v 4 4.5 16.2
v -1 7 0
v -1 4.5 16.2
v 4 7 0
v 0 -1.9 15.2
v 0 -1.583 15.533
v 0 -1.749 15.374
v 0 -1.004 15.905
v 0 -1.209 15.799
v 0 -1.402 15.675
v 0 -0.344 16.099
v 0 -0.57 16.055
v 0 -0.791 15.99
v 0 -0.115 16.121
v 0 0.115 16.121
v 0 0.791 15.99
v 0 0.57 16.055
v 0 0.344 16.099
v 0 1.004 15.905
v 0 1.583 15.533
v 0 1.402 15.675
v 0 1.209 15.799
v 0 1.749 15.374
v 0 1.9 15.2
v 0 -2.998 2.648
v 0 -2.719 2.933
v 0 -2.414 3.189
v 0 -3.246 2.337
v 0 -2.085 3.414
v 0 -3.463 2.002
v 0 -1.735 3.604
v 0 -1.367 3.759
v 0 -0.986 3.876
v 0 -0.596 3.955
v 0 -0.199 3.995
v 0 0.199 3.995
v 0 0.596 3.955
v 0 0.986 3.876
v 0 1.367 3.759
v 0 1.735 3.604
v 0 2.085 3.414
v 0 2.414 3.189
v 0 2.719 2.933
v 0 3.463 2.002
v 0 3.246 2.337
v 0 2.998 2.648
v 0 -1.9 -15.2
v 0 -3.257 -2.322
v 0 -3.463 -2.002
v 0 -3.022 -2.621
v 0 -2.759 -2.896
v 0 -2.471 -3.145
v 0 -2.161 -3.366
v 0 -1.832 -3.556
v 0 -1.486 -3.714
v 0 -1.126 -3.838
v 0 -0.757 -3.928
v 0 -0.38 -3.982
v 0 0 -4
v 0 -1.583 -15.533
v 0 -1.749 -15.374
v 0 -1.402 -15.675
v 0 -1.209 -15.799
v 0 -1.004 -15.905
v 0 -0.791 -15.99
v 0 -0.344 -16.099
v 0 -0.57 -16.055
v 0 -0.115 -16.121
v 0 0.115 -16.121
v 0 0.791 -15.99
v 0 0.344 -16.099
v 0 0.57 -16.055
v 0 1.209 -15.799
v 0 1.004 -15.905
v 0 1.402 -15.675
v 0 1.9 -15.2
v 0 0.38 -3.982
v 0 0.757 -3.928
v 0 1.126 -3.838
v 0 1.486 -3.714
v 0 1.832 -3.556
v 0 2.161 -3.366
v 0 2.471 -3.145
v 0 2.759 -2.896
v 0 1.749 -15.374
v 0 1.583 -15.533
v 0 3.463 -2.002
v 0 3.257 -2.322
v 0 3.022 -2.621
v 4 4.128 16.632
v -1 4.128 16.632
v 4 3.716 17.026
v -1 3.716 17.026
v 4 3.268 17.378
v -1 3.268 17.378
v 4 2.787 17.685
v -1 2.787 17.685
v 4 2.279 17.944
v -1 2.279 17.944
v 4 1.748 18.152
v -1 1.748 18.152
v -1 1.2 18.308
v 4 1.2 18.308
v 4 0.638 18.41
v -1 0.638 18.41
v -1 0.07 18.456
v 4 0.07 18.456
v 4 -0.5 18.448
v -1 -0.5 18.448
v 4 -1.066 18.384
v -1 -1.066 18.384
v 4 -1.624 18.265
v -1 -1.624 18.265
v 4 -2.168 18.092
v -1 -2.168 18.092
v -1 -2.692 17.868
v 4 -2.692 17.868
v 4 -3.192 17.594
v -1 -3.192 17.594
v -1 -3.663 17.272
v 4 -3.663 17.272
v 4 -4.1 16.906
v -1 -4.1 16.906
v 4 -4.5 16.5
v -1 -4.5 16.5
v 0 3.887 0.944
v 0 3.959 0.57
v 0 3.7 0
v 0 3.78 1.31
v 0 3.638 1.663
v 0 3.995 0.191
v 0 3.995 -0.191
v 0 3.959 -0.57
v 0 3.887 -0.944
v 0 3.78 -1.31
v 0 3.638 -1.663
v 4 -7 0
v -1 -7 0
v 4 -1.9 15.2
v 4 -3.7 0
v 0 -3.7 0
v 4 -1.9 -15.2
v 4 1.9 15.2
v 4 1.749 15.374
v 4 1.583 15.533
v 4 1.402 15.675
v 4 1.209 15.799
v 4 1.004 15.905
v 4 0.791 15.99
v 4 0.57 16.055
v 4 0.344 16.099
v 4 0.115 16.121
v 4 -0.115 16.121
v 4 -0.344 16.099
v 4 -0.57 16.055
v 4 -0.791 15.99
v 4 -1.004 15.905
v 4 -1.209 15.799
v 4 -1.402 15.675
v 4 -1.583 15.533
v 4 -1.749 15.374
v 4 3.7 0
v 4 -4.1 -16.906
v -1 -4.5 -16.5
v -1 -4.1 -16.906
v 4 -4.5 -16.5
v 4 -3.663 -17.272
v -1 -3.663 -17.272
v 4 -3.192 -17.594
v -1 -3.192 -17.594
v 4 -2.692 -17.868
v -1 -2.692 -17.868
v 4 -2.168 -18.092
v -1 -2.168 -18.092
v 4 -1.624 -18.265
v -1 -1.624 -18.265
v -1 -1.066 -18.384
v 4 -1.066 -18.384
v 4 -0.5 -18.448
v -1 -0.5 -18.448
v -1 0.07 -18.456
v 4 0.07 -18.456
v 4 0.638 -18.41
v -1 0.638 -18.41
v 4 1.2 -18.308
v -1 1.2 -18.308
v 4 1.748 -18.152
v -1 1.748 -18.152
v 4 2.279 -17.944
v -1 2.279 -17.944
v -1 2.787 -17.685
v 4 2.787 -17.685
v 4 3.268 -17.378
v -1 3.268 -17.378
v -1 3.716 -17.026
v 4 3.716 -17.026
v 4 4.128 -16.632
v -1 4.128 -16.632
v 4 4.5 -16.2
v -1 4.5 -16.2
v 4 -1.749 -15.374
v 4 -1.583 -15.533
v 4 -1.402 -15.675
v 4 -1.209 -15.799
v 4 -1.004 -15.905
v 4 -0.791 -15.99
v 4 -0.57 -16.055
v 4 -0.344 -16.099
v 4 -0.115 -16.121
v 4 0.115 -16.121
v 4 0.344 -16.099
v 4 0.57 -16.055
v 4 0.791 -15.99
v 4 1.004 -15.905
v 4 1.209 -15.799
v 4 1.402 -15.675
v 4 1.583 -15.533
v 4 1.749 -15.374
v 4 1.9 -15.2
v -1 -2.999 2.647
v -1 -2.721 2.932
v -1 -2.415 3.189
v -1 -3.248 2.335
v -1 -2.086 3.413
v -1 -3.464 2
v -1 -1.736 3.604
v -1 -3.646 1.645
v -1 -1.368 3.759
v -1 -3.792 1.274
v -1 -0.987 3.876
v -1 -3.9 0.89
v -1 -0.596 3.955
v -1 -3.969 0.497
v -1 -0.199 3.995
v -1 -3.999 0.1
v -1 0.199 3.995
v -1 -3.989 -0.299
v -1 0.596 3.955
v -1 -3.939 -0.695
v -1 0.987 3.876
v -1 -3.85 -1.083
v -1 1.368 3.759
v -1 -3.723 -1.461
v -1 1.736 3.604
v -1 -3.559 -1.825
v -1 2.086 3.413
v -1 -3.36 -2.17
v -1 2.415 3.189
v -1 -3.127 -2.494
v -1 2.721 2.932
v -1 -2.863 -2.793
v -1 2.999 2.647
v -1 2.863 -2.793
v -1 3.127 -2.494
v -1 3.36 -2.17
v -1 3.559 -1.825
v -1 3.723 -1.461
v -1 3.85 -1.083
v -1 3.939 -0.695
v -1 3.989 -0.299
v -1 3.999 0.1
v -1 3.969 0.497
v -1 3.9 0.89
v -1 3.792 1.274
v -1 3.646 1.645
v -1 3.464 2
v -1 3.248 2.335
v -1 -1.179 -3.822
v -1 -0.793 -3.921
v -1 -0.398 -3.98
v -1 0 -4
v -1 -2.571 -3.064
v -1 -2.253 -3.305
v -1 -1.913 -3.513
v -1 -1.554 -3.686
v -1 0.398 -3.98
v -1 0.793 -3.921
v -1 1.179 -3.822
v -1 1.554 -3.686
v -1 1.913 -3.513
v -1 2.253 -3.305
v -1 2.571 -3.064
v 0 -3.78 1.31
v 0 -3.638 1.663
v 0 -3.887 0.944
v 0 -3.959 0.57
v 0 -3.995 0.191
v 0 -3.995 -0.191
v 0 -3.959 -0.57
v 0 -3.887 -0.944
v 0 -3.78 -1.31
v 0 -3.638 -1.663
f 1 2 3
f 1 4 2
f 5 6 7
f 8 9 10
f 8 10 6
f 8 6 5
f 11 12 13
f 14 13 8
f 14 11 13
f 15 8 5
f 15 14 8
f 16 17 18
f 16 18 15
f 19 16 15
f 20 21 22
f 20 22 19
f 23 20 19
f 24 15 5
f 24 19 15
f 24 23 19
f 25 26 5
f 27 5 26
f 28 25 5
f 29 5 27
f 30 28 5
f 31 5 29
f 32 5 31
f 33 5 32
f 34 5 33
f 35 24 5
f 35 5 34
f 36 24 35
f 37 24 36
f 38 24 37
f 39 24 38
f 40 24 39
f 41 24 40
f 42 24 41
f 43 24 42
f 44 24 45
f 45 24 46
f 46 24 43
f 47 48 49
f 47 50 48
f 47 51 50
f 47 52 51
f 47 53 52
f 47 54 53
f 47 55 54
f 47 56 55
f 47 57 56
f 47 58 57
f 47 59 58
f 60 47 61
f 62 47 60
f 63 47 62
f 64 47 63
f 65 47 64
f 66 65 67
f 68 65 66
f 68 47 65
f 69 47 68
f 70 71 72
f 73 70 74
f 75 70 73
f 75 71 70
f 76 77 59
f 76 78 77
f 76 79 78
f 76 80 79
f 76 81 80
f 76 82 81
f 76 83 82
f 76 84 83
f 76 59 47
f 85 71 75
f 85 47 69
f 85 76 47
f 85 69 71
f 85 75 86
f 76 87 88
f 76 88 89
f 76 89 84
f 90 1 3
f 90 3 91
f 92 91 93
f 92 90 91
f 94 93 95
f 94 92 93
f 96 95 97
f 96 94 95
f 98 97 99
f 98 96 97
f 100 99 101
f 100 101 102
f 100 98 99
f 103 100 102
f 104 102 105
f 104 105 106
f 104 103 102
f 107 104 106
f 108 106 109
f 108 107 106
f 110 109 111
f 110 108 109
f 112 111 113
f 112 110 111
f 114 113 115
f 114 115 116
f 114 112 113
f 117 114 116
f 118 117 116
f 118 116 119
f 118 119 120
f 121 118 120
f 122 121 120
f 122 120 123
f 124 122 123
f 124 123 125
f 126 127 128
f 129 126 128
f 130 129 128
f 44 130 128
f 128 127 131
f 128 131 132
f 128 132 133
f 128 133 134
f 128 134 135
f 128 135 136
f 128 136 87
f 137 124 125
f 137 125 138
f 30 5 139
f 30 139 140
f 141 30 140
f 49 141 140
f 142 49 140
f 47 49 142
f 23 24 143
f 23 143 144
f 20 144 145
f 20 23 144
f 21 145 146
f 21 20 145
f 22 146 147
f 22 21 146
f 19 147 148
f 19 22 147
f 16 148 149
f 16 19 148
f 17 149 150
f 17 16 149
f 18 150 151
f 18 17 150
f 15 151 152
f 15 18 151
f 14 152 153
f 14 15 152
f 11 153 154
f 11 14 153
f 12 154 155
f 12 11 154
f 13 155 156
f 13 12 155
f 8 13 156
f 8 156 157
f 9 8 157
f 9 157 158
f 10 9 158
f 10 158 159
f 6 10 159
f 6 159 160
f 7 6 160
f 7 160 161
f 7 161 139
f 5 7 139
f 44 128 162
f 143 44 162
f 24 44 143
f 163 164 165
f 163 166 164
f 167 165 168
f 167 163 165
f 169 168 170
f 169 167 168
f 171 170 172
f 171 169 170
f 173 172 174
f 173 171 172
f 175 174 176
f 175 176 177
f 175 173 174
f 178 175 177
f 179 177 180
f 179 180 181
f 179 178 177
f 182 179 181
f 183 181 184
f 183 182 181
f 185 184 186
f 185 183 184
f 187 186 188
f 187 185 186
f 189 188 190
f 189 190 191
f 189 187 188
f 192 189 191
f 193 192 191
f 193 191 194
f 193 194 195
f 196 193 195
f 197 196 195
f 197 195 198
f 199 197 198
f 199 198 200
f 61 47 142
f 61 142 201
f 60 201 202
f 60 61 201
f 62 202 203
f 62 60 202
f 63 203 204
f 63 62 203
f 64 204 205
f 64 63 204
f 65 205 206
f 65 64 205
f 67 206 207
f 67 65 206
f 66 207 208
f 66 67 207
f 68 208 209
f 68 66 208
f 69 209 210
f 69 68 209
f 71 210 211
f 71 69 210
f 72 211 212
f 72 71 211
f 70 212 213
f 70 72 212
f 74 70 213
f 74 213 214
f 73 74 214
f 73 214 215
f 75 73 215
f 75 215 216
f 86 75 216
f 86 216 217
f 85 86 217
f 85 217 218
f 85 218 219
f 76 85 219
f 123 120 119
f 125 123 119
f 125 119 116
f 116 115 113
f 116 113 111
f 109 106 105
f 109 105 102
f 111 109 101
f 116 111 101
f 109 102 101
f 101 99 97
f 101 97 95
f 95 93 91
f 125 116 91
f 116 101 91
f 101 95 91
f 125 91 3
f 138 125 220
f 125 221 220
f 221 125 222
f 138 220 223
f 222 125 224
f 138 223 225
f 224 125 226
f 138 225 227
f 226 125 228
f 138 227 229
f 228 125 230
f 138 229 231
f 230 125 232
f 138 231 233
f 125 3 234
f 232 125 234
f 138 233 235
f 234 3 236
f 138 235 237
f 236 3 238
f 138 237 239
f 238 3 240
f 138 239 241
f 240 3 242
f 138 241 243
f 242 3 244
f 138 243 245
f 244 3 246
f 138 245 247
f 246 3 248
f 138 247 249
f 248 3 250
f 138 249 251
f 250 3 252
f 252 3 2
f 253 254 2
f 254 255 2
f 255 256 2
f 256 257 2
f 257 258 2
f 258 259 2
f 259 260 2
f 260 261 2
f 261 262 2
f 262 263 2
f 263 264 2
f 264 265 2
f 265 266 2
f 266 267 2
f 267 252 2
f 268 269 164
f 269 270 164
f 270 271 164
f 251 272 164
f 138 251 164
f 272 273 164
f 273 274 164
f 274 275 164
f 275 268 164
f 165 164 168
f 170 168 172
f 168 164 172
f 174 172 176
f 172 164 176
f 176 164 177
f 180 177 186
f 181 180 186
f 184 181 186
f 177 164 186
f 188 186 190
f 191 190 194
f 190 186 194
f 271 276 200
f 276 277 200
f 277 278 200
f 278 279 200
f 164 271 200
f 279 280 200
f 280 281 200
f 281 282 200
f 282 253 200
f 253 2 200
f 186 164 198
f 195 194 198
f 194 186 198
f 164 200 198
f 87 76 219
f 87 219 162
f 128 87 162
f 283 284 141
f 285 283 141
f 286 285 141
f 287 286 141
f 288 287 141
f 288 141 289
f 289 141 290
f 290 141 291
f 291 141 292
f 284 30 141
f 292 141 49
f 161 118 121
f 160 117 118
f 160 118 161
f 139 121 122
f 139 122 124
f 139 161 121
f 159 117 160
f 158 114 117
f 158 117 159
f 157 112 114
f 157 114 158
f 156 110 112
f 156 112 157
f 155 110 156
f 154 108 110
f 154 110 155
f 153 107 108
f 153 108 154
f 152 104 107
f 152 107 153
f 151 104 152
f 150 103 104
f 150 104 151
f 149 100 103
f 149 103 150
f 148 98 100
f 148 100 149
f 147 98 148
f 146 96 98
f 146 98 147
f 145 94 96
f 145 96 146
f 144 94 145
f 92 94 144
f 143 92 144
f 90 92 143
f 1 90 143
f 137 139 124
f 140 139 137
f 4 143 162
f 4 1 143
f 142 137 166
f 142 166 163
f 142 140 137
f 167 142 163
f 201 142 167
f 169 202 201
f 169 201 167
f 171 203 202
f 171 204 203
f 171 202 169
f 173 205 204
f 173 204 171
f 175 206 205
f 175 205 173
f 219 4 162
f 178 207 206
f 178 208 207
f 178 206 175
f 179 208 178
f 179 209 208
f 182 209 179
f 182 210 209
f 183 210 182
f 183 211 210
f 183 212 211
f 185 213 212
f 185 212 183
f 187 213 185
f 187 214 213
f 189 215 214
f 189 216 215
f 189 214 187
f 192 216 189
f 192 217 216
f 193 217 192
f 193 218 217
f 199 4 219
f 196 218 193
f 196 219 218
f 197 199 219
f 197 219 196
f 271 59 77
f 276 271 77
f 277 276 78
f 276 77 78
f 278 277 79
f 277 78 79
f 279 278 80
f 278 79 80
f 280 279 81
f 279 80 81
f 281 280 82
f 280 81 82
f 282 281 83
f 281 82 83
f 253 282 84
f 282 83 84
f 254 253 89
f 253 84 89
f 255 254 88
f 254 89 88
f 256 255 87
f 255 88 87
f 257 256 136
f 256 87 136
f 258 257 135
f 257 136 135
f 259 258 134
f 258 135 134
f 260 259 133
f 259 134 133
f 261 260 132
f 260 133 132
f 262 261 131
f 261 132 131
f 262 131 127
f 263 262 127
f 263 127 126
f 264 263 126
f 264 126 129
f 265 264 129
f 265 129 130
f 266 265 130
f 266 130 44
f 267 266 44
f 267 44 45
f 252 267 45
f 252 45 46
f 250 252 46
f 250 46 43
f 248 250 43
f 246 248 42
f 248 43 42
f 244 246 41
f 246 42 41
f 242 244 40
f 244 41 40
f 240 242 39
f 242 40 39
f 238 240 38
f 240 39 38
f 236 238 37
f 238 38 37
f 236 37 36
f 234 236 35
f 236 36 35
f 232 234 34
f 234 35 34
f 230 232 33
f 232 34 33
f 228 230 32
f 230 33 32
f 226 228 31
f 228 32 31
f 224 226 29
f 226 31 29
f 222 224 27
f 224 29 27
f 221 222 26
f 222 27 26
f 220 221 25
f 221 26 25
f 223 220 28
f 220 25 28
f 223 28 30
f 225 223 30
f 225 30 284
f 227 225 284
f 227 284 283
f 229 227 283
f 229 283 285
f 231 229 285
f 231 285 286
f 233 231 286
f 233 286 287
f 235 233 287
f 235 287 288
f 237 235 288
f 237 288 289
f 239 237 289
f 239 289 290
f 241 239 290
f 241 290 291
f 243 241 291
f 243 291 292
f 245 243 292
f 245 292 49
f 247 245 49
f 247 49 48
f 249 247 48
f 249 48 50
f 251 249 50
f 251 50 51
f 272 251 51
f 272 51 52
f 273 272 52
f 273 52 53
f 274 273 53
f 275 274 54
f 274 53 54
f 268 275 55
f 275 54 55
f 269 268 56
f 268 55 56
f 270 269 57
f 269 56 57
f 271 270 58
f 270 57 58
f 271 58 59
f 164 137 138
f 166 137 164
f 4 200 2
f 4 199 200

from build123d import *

# Parameters (mm, degrees)
BOSS_EXTRUDE1_DEPTH = 4
SKETCH2_R           = 4
BOSS_EXTRUDE2_DEPTH = 1


with BuildPart() as part:
    # Sketch1 → Boss-Extrude1 (new body)
    with BuildSketch(Plane(origin=(0, 0, 0), x_dir=(0, 0, -1), z_dir=(1, 0, 0))):
        with BuildLine():
            Line((0, 7), (-16.2, 4.5))
            ThreePointArc((-16.2, 4.5), (-18.456321812, 0.070210727), (-16.5, -4.5))
            Line((-16.5, -4.5), (0, -7))
            Line((0, -7), (16.5, -4.5))
            ThreePointArc((16.5, -4.5), (18.456321812, 0.070210727), (16.2, 4.5))
            Line((16.2, 4.5), (0, 7))
        make_face()
        with BuildLine():
            Line((0, 3.7), (-15.2, 1.9))
            ThreePointArc((-15.2, 1.9), (-16.123290742, 0), (-15.2, -1.9))
            Line((-15.2, -1.9), (0, -3.7))
            Line((0, -3.7), (15.2, -1.9))
            ThreePointArc((15.2, -1.9), (16.123290742, 0), (15.2, 1.9))
            Line((15.2, 1.9), (0, 3.7))
        make_face(mode=Mode.SUBTRACT)
    extrude(amount=BOSS_EXTRUDE1_DEPTH)

    # Sketch2 → Boss-Extrude2 (add)
    with BuildSketch(Plane(origin=(0, 0, 0), x_dir=(0, 0, -1), z_dir=(1, 0, 0))):
        with BuildLine():
            Line((0, 7), (-16.2, 4.5))
            ThreePointArc((-16.2, 4.5), (-18.456321812, 0.070210727), (-16.5, -4.5))
            Line((-16.5, -4.5), (0, -7))
            Line((0, -7), (16.5, -4.5))
            ThreePointArc((16.5, -4.5), (18.456321812, 0.070210727), (16.2, 4.5))
            Line((16.2, 4.5), (0, 7))
        make_face()
        Circle(SKETCH2_R, mode=Mode.SUBTRACT)
    extrude(amount=-BOSS_EXTRUDE2_DEPTH)


solid = part.part
